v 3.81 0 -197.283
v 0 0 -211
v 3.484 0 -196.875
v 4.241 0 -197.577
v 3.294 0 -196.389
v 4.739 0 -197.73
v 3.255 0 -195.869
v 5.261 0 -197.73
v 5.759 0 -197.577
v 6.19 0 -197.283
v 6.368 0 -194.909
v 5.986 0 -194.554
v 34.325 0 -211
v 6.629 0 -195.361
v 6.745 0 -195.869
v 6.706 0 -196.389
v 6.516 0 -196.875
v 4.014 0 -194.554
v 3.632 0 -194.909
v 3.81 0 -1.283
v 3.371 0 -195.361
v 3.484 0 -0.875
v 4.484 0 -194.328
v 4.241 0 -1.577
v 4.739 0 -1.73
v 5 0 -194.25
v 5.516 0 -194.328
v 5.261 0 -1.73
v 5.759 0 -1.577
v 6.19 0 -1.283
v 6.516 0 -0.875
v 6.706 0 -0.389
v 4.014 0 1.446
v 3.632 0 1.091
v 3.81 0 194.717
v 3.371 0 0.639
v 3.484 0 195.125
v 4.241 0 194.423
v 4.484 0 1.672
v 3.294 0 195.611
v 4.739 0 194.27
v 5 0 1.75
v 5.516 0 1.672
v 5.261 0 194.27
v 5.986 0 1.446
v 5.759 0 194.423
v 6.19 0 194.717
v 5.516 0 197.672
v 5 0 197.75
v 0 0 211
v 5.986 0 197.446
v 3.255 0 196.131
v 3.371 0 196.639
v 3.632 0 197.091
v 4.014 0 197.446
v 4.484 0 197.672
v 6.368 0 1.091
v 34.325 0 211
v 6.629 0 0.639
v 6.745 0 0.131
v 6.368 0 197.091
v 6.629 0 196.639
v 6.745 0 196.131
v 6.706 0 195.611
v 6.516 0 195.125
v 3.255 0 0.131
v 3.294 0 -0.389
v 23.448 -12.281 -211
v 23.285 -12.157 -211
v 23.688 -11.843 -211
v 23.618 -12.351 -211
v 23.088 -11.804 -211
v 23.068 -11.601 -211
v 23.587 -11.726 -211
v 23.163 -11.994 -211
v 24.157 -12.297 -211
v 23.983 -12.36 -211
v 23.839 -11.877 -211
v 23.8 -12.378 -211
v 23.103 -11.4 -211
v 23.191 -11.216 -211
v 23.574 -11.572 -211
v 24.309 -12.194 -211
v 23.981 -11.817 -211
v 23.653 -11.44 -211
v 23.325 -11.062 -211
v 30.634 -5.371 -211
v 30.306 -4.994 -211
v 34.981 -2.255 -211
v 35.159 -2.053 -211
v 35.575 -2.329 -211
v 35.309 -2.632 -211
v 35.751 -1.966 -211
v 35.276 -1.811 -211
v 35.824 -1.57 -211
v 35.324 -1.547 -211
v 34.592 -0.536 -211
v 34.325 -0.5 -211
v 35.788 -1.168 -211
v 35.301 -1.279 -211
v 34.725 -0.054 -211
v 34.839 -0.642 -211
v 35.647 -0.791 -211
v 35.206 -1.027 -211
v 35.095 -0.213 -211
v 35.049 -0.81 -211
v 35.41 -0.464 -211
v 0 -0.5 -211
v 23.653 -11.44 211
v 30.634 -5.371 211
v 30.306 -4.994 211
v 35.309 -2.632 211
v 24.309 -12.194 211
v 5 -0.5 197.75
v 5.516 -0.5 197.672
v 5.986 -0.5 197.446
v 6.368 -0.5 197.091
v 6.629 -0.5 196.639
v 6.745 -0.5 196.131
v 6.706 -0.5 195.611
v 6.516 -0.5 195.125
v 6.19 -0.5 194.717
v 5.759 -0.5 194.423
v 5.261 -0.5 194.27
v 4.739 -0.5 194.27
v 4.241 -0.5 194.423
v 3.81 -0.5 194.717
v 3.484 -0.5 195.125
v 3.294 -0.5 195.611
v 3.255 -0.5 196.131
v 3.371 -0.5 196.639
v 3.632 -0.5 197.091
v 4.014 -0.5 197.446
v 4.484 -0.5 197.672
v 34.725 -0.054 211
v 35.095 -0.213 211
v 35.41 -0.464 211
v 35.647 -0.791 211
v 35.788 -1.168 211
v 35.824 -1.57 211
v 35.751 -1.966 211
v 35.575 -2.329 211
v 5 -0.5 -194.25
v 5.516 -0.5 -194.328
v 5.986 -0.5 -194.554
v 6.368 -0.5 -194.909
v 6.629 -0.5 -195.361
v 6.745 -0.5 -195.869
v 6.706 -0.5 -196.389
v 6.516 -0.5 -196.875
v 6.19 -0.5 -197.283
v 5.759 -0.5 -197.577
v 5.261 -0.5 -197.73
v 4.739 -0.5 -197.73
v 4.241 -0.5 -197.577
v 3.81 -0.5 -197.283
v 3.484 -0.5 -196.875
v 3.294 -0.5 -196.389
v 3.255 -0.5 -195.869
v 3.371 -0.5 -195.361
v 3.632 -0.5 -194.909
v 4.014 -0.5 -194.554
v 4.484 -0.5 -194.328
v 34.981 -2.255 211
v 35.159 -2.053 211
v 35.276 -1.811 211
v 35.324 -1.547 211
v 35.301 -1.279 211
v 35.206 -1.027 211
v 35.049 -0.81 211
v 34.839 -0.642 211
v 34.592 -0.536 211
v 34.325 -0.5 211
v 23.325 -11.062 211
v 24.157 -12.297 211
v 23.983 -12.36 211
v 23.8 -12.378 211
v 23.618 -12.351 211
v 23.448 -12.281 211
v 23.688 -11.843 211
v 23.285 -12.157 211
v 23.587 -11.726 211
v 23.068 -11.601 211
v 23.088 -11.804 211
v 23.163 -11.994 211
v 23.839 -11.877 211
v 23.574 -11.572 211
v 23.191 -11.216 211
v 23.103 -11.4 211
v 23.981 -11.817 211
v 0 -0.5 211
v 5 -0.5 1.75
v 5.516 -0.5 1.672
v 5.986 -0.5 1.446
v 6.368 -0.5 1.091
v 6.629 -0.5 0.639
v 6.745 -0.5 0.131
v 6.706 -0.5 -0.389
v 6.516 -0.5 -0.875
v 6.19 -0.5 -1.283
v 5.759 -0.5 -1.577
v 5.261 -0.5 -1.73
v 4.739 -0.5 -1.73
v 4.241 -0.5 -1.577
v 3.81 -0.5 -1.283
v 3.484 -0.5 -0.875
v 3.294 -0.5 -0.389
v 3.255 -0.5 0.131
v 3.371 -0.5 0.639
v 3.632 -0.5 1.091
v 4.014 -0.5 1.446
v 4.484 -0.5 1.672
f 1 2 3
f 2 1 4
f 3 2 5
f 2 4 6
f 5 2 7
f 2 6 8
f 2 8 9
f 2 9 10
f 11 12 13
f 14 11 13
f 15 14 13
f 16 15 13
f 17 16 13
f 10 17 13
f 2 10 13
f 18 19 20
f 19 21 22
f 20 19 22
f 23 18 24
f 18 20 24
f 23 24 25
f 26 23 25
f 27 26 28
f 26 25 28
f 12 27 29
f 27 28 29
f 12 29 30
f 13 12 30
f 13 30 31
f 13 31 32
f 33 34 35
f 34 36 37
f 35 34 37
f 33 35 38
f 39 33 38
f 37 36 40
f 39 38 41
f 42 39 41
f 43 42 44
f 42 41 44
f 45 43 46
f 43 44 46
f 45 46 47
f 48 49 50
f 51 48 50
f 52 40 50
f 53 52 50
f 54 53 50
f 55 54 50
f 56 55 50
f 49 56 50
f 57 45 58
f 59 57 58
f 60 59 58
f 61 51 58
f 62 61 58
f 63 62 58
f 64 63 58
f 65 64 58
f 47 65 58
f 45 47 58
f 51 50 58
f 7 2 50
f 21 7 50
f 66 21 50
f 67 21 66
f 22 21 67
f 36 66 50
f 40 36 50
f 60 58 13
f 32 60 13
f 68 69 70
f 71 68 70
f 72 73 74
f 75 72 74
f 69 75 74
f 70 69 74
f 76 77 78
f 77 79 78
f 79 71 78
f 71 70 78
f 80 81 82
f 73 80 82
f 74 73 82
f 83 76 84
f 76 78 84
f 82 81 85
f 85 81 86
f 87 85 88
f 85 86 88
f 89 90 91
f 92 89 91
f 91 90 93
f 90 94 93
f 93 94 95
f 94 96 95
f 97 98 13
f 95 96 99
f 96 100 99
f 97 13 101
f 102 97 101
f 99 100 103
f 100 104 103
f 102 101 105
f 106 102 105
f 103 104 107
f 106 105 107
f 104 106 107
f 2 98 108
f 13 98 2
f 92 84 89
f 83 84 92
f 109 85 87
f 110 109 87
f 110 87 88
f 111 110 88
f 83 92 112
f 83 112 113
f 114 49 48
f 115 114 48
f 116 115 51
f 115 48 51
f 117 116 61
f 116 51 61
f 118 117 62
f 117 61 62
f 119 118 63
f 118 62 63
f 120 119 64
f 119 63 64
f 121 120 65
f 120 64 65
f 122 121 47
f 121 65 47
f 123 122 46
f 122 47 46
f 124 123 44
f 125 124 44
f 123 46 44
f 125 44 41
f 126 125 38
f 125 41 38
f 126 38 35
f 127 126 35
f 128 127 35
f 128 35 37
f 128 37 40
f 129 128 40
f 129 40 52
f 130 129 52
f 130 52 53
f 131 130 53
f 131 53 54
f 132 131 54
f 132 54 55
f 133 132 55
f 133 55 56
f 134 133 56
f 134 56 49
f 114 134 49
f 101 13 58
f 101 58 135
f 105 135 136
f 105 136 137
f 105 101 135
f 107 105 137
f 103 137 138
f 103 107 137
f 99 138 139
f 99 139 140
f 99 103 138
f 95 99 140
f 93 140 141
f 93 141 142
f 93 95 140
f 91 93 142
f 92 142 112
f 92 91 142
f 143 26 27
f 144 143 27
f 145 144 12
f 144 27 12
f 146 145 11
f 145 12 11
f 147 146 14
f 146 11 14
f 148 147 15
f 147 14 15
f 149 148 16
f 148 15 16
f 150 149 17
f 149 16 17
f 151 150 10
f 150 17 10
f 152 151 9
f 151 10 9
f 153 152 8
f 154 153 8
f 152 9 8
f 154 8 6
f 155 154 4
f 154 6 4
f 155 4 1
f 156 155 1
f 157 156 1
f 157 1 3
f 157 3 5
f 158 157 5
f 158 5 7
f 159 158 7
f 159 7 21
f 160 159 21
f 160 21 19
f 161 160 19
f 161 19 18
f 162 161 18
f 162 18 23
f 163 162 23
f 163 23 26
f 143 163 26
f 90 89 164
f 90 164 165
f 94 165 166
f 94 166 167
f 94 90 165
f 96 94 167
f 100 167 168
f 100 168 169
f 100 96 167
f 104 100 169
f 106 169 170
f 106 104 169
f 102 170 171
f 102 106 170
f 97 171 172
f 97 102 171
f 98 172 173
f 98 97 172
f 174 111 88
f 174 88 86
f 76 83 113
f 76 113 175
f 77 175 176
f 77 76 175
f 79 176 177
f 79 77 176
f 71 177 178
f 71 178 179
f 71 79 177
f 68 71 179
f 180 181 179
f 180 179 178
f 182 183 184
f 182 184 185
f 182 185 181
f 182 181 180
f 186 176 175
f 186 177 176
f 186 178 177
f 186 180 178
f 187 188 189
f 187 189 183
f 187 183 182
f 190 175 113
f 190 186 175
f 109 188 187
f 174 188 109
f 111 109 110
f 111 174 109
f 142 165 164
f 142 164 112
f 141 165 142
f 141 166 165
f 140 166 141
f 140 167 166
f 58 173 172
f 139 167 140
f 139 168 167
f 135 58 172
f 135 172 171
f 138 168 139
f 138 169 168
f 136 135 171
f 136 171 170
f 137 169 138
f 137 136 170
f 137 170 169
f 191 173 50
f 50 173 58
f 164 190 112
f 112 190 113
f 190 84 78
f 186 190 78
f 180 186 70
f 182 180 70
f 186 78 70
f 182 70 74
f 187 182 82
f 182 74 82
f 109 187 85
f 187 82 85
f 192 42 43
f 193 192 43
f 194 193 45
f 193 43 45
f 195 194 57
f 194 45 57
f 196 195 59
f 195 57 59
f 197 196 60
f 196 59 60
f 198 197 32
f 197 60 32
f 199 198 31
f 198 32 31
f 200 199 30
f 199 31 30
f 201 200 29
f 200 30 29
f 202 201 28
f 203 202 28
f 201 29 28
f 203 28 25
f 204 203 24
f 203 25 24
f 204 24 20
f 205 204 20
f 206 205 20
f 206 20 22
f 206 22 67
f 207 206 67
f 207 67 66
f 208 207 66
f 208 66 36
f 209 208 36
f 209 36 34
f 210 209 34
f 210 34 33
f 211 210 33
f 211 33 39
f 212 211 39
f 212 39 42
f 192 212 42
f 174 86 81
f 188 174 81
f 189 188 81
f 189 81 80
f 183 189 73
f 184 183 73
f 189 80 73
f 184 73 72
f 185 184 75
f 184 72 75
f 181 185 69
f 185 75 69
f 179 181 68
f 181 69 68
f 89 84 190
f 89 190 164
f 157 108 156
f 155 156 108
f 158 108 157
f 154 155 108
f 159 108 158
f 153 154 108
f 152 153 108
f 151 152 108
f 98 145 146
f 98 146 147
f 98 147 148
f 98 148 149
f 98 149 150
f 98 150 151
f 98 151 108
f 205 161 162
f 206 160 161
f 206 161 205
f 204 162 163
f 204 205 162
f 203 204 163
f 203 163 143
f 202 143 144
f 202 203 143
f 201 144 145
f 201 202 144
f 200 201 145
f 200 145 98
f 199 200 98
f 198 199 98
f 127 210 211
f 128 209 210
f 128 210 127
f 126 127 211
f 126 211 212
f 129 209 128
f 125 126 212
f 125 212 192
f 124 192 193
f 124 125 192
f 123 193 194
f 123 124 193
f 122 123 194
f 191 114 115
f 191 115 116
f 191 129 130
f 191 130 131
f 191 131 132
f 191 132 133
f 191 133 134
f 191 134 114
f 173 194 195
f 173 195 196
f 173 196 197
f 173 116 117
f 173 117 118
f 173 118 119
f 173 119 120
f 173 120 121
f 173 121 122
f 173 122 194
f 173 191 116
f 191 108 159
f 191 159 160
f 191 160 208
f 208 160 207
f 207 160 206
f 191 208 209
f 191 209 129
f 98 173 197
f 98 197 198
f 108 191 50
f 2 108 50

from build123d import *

# Parameters (mm, degrees)
SKETCH1_W                    = 37
SKETCH1_H                    = 0.5
BASE_FLANGE1_DEPTH           = 211
SKETCH6_R                    = 1.75
CUT_EXTRUDE1_DEPTH           = 10
EDGE_FLANGE1_STRIP_CUT_DEPTH = 422
EDGE_FLANGE1_DEPTH           = 422
HEM1_START                   = -211
HEM1_DEPTH                   = 422
HEM1_2_DEPTH                 = 422


with BuildPart() as part:
    # Base-Flange1: sheet metal written as solids
    # Sketch1 → Base-Flange1 (new, symmetric)
    with BuildSketch(Plane.XY):
        with Locations((18.5, -0.25)):
            Rectangle(SKETCH1_W, SKETCH1_H)
    extrude(amount=BASE_FLANGE1_DEPTH, both=True)

    # Sketch6 → Cut-Extrude1 (cut)
    with BuildSketch(Plane(origin=(0, 0, 0), x_dir=(1, 0, 0), z_dir=(0, 1, 0))):
        with Locations(Location((5, 196, 0), (0, 0, 270))):
            Circle(SKETCH6_R)
        with Locations(Location((5, 0, 0), (0, 0, 270))):
            Circle(SKETCH6_R)
        with Locations(Location((5, -196, 0), (0, 0, 270))):
            Circle(SKETCH6_R)
    extrude(amount=-CUT_EXTRUDE1_DEPTH, mode=Mode.SUBTRACT)

    # Edge-Flange1: sheet metal written as solids
    # Edge-Flange1 strip (on a plane across the edge) → Edge-Flange1 strip cut (cut)
    with BuildSketch(Plane(origin=(37, -0.5, -211), x_dir=(-0.6560590289905086, 0.754709580222771, 0), z_dir=(0, 0, 1))):
        Polygon((-4.886773951, -6.383716909), (2.13206437, 1.69053295), (1.75470958, 2.018562465), (-5.264128741, -6.055687395), align=None)
    extrude(amount=EDGE_FLANGE1_STRIP_CUT_DEPTH, mode=Mode.SUBTRACT)

    # Edge-Flange1 section (on a plane across the edge) → Edge-Flange1 (add)
    with BuildSketch(Plane(origin=(37, -0.5, -211), x_dir=(-0.6560590289905086, 0.754709580222771, 0), z_dir=(0, 0, 1))):
        with BuildLine():
            Line((-0.5, 2.674621494), (-0.5, 18))
            Line((-0.5, 18), (0, 18))
            Line((0, 18), (0, 2.674621494))
            ThreePointArc((0, 2.674621494), (0.649792619, 1.737949305), (1.75470958, 2.018562465))
            Line((1.75470958, 2.018562465), (2.13206437, 1.69053295))
            ThreePointArc((2.13206437, 1.69053295), (0.474688928, 1.26961321), (-0.5, 2.674621494))
        make_face()
    extrude(amount=EDGE_FLANGE1_DEPTH)

    # Hem1: read off the stored shape, not the designer's step
    # Hem1 outline → Hem1 (cut)
    with BuildSketch(Plane.XY.offset(HEM1_START)):
        with BuildLine():
            ThreePointArc((24.309289256, -12.19437304), (23.892198615, -12.374586092), (23.447599479, -12.280922038))
            Line((23.447599479, -12.280922038), (23.415227556, -12.309062522))
            Line((23.415227556, -12.309062522), (23.74325707, -12.686417312))
            Line((23.74325707, -12.686417312), (24.309289256, -12.19437304))
        make_face()
    extrude(amount=HEM1_DEPTH, mode=Mode.SUBTRACT)

    # Hem1 2 outline → Hem1 2 (add)
    with BuildSketch(Plane.XY.offset(HEM1_START)):
        with BuildLine():
            Line((30.634293844, -5.371117442), (30.306264329, -4.993762652))
            Line((30.306264329, -4.993762652), (23.325200712, -11.06230867))
            ThreePointArc((23.325200712, -11.06230867), (23.070999747, -11.703294486), (23.447599479, -12.280922038))
            Line((23.447599479, -12.280922038), (23.981259741, -11.81701825))
            ThreePointArc((23.981259741, -11.81701825), (23.628567589, -11.792355612), (23.653230227, -11.43966346))
            Line((23.653230227, -11.43966346), (30.634293844, -5.371117442))
        make_face()
    extrude(amount=HEM1_2_DEPTH)


solid = part.part
